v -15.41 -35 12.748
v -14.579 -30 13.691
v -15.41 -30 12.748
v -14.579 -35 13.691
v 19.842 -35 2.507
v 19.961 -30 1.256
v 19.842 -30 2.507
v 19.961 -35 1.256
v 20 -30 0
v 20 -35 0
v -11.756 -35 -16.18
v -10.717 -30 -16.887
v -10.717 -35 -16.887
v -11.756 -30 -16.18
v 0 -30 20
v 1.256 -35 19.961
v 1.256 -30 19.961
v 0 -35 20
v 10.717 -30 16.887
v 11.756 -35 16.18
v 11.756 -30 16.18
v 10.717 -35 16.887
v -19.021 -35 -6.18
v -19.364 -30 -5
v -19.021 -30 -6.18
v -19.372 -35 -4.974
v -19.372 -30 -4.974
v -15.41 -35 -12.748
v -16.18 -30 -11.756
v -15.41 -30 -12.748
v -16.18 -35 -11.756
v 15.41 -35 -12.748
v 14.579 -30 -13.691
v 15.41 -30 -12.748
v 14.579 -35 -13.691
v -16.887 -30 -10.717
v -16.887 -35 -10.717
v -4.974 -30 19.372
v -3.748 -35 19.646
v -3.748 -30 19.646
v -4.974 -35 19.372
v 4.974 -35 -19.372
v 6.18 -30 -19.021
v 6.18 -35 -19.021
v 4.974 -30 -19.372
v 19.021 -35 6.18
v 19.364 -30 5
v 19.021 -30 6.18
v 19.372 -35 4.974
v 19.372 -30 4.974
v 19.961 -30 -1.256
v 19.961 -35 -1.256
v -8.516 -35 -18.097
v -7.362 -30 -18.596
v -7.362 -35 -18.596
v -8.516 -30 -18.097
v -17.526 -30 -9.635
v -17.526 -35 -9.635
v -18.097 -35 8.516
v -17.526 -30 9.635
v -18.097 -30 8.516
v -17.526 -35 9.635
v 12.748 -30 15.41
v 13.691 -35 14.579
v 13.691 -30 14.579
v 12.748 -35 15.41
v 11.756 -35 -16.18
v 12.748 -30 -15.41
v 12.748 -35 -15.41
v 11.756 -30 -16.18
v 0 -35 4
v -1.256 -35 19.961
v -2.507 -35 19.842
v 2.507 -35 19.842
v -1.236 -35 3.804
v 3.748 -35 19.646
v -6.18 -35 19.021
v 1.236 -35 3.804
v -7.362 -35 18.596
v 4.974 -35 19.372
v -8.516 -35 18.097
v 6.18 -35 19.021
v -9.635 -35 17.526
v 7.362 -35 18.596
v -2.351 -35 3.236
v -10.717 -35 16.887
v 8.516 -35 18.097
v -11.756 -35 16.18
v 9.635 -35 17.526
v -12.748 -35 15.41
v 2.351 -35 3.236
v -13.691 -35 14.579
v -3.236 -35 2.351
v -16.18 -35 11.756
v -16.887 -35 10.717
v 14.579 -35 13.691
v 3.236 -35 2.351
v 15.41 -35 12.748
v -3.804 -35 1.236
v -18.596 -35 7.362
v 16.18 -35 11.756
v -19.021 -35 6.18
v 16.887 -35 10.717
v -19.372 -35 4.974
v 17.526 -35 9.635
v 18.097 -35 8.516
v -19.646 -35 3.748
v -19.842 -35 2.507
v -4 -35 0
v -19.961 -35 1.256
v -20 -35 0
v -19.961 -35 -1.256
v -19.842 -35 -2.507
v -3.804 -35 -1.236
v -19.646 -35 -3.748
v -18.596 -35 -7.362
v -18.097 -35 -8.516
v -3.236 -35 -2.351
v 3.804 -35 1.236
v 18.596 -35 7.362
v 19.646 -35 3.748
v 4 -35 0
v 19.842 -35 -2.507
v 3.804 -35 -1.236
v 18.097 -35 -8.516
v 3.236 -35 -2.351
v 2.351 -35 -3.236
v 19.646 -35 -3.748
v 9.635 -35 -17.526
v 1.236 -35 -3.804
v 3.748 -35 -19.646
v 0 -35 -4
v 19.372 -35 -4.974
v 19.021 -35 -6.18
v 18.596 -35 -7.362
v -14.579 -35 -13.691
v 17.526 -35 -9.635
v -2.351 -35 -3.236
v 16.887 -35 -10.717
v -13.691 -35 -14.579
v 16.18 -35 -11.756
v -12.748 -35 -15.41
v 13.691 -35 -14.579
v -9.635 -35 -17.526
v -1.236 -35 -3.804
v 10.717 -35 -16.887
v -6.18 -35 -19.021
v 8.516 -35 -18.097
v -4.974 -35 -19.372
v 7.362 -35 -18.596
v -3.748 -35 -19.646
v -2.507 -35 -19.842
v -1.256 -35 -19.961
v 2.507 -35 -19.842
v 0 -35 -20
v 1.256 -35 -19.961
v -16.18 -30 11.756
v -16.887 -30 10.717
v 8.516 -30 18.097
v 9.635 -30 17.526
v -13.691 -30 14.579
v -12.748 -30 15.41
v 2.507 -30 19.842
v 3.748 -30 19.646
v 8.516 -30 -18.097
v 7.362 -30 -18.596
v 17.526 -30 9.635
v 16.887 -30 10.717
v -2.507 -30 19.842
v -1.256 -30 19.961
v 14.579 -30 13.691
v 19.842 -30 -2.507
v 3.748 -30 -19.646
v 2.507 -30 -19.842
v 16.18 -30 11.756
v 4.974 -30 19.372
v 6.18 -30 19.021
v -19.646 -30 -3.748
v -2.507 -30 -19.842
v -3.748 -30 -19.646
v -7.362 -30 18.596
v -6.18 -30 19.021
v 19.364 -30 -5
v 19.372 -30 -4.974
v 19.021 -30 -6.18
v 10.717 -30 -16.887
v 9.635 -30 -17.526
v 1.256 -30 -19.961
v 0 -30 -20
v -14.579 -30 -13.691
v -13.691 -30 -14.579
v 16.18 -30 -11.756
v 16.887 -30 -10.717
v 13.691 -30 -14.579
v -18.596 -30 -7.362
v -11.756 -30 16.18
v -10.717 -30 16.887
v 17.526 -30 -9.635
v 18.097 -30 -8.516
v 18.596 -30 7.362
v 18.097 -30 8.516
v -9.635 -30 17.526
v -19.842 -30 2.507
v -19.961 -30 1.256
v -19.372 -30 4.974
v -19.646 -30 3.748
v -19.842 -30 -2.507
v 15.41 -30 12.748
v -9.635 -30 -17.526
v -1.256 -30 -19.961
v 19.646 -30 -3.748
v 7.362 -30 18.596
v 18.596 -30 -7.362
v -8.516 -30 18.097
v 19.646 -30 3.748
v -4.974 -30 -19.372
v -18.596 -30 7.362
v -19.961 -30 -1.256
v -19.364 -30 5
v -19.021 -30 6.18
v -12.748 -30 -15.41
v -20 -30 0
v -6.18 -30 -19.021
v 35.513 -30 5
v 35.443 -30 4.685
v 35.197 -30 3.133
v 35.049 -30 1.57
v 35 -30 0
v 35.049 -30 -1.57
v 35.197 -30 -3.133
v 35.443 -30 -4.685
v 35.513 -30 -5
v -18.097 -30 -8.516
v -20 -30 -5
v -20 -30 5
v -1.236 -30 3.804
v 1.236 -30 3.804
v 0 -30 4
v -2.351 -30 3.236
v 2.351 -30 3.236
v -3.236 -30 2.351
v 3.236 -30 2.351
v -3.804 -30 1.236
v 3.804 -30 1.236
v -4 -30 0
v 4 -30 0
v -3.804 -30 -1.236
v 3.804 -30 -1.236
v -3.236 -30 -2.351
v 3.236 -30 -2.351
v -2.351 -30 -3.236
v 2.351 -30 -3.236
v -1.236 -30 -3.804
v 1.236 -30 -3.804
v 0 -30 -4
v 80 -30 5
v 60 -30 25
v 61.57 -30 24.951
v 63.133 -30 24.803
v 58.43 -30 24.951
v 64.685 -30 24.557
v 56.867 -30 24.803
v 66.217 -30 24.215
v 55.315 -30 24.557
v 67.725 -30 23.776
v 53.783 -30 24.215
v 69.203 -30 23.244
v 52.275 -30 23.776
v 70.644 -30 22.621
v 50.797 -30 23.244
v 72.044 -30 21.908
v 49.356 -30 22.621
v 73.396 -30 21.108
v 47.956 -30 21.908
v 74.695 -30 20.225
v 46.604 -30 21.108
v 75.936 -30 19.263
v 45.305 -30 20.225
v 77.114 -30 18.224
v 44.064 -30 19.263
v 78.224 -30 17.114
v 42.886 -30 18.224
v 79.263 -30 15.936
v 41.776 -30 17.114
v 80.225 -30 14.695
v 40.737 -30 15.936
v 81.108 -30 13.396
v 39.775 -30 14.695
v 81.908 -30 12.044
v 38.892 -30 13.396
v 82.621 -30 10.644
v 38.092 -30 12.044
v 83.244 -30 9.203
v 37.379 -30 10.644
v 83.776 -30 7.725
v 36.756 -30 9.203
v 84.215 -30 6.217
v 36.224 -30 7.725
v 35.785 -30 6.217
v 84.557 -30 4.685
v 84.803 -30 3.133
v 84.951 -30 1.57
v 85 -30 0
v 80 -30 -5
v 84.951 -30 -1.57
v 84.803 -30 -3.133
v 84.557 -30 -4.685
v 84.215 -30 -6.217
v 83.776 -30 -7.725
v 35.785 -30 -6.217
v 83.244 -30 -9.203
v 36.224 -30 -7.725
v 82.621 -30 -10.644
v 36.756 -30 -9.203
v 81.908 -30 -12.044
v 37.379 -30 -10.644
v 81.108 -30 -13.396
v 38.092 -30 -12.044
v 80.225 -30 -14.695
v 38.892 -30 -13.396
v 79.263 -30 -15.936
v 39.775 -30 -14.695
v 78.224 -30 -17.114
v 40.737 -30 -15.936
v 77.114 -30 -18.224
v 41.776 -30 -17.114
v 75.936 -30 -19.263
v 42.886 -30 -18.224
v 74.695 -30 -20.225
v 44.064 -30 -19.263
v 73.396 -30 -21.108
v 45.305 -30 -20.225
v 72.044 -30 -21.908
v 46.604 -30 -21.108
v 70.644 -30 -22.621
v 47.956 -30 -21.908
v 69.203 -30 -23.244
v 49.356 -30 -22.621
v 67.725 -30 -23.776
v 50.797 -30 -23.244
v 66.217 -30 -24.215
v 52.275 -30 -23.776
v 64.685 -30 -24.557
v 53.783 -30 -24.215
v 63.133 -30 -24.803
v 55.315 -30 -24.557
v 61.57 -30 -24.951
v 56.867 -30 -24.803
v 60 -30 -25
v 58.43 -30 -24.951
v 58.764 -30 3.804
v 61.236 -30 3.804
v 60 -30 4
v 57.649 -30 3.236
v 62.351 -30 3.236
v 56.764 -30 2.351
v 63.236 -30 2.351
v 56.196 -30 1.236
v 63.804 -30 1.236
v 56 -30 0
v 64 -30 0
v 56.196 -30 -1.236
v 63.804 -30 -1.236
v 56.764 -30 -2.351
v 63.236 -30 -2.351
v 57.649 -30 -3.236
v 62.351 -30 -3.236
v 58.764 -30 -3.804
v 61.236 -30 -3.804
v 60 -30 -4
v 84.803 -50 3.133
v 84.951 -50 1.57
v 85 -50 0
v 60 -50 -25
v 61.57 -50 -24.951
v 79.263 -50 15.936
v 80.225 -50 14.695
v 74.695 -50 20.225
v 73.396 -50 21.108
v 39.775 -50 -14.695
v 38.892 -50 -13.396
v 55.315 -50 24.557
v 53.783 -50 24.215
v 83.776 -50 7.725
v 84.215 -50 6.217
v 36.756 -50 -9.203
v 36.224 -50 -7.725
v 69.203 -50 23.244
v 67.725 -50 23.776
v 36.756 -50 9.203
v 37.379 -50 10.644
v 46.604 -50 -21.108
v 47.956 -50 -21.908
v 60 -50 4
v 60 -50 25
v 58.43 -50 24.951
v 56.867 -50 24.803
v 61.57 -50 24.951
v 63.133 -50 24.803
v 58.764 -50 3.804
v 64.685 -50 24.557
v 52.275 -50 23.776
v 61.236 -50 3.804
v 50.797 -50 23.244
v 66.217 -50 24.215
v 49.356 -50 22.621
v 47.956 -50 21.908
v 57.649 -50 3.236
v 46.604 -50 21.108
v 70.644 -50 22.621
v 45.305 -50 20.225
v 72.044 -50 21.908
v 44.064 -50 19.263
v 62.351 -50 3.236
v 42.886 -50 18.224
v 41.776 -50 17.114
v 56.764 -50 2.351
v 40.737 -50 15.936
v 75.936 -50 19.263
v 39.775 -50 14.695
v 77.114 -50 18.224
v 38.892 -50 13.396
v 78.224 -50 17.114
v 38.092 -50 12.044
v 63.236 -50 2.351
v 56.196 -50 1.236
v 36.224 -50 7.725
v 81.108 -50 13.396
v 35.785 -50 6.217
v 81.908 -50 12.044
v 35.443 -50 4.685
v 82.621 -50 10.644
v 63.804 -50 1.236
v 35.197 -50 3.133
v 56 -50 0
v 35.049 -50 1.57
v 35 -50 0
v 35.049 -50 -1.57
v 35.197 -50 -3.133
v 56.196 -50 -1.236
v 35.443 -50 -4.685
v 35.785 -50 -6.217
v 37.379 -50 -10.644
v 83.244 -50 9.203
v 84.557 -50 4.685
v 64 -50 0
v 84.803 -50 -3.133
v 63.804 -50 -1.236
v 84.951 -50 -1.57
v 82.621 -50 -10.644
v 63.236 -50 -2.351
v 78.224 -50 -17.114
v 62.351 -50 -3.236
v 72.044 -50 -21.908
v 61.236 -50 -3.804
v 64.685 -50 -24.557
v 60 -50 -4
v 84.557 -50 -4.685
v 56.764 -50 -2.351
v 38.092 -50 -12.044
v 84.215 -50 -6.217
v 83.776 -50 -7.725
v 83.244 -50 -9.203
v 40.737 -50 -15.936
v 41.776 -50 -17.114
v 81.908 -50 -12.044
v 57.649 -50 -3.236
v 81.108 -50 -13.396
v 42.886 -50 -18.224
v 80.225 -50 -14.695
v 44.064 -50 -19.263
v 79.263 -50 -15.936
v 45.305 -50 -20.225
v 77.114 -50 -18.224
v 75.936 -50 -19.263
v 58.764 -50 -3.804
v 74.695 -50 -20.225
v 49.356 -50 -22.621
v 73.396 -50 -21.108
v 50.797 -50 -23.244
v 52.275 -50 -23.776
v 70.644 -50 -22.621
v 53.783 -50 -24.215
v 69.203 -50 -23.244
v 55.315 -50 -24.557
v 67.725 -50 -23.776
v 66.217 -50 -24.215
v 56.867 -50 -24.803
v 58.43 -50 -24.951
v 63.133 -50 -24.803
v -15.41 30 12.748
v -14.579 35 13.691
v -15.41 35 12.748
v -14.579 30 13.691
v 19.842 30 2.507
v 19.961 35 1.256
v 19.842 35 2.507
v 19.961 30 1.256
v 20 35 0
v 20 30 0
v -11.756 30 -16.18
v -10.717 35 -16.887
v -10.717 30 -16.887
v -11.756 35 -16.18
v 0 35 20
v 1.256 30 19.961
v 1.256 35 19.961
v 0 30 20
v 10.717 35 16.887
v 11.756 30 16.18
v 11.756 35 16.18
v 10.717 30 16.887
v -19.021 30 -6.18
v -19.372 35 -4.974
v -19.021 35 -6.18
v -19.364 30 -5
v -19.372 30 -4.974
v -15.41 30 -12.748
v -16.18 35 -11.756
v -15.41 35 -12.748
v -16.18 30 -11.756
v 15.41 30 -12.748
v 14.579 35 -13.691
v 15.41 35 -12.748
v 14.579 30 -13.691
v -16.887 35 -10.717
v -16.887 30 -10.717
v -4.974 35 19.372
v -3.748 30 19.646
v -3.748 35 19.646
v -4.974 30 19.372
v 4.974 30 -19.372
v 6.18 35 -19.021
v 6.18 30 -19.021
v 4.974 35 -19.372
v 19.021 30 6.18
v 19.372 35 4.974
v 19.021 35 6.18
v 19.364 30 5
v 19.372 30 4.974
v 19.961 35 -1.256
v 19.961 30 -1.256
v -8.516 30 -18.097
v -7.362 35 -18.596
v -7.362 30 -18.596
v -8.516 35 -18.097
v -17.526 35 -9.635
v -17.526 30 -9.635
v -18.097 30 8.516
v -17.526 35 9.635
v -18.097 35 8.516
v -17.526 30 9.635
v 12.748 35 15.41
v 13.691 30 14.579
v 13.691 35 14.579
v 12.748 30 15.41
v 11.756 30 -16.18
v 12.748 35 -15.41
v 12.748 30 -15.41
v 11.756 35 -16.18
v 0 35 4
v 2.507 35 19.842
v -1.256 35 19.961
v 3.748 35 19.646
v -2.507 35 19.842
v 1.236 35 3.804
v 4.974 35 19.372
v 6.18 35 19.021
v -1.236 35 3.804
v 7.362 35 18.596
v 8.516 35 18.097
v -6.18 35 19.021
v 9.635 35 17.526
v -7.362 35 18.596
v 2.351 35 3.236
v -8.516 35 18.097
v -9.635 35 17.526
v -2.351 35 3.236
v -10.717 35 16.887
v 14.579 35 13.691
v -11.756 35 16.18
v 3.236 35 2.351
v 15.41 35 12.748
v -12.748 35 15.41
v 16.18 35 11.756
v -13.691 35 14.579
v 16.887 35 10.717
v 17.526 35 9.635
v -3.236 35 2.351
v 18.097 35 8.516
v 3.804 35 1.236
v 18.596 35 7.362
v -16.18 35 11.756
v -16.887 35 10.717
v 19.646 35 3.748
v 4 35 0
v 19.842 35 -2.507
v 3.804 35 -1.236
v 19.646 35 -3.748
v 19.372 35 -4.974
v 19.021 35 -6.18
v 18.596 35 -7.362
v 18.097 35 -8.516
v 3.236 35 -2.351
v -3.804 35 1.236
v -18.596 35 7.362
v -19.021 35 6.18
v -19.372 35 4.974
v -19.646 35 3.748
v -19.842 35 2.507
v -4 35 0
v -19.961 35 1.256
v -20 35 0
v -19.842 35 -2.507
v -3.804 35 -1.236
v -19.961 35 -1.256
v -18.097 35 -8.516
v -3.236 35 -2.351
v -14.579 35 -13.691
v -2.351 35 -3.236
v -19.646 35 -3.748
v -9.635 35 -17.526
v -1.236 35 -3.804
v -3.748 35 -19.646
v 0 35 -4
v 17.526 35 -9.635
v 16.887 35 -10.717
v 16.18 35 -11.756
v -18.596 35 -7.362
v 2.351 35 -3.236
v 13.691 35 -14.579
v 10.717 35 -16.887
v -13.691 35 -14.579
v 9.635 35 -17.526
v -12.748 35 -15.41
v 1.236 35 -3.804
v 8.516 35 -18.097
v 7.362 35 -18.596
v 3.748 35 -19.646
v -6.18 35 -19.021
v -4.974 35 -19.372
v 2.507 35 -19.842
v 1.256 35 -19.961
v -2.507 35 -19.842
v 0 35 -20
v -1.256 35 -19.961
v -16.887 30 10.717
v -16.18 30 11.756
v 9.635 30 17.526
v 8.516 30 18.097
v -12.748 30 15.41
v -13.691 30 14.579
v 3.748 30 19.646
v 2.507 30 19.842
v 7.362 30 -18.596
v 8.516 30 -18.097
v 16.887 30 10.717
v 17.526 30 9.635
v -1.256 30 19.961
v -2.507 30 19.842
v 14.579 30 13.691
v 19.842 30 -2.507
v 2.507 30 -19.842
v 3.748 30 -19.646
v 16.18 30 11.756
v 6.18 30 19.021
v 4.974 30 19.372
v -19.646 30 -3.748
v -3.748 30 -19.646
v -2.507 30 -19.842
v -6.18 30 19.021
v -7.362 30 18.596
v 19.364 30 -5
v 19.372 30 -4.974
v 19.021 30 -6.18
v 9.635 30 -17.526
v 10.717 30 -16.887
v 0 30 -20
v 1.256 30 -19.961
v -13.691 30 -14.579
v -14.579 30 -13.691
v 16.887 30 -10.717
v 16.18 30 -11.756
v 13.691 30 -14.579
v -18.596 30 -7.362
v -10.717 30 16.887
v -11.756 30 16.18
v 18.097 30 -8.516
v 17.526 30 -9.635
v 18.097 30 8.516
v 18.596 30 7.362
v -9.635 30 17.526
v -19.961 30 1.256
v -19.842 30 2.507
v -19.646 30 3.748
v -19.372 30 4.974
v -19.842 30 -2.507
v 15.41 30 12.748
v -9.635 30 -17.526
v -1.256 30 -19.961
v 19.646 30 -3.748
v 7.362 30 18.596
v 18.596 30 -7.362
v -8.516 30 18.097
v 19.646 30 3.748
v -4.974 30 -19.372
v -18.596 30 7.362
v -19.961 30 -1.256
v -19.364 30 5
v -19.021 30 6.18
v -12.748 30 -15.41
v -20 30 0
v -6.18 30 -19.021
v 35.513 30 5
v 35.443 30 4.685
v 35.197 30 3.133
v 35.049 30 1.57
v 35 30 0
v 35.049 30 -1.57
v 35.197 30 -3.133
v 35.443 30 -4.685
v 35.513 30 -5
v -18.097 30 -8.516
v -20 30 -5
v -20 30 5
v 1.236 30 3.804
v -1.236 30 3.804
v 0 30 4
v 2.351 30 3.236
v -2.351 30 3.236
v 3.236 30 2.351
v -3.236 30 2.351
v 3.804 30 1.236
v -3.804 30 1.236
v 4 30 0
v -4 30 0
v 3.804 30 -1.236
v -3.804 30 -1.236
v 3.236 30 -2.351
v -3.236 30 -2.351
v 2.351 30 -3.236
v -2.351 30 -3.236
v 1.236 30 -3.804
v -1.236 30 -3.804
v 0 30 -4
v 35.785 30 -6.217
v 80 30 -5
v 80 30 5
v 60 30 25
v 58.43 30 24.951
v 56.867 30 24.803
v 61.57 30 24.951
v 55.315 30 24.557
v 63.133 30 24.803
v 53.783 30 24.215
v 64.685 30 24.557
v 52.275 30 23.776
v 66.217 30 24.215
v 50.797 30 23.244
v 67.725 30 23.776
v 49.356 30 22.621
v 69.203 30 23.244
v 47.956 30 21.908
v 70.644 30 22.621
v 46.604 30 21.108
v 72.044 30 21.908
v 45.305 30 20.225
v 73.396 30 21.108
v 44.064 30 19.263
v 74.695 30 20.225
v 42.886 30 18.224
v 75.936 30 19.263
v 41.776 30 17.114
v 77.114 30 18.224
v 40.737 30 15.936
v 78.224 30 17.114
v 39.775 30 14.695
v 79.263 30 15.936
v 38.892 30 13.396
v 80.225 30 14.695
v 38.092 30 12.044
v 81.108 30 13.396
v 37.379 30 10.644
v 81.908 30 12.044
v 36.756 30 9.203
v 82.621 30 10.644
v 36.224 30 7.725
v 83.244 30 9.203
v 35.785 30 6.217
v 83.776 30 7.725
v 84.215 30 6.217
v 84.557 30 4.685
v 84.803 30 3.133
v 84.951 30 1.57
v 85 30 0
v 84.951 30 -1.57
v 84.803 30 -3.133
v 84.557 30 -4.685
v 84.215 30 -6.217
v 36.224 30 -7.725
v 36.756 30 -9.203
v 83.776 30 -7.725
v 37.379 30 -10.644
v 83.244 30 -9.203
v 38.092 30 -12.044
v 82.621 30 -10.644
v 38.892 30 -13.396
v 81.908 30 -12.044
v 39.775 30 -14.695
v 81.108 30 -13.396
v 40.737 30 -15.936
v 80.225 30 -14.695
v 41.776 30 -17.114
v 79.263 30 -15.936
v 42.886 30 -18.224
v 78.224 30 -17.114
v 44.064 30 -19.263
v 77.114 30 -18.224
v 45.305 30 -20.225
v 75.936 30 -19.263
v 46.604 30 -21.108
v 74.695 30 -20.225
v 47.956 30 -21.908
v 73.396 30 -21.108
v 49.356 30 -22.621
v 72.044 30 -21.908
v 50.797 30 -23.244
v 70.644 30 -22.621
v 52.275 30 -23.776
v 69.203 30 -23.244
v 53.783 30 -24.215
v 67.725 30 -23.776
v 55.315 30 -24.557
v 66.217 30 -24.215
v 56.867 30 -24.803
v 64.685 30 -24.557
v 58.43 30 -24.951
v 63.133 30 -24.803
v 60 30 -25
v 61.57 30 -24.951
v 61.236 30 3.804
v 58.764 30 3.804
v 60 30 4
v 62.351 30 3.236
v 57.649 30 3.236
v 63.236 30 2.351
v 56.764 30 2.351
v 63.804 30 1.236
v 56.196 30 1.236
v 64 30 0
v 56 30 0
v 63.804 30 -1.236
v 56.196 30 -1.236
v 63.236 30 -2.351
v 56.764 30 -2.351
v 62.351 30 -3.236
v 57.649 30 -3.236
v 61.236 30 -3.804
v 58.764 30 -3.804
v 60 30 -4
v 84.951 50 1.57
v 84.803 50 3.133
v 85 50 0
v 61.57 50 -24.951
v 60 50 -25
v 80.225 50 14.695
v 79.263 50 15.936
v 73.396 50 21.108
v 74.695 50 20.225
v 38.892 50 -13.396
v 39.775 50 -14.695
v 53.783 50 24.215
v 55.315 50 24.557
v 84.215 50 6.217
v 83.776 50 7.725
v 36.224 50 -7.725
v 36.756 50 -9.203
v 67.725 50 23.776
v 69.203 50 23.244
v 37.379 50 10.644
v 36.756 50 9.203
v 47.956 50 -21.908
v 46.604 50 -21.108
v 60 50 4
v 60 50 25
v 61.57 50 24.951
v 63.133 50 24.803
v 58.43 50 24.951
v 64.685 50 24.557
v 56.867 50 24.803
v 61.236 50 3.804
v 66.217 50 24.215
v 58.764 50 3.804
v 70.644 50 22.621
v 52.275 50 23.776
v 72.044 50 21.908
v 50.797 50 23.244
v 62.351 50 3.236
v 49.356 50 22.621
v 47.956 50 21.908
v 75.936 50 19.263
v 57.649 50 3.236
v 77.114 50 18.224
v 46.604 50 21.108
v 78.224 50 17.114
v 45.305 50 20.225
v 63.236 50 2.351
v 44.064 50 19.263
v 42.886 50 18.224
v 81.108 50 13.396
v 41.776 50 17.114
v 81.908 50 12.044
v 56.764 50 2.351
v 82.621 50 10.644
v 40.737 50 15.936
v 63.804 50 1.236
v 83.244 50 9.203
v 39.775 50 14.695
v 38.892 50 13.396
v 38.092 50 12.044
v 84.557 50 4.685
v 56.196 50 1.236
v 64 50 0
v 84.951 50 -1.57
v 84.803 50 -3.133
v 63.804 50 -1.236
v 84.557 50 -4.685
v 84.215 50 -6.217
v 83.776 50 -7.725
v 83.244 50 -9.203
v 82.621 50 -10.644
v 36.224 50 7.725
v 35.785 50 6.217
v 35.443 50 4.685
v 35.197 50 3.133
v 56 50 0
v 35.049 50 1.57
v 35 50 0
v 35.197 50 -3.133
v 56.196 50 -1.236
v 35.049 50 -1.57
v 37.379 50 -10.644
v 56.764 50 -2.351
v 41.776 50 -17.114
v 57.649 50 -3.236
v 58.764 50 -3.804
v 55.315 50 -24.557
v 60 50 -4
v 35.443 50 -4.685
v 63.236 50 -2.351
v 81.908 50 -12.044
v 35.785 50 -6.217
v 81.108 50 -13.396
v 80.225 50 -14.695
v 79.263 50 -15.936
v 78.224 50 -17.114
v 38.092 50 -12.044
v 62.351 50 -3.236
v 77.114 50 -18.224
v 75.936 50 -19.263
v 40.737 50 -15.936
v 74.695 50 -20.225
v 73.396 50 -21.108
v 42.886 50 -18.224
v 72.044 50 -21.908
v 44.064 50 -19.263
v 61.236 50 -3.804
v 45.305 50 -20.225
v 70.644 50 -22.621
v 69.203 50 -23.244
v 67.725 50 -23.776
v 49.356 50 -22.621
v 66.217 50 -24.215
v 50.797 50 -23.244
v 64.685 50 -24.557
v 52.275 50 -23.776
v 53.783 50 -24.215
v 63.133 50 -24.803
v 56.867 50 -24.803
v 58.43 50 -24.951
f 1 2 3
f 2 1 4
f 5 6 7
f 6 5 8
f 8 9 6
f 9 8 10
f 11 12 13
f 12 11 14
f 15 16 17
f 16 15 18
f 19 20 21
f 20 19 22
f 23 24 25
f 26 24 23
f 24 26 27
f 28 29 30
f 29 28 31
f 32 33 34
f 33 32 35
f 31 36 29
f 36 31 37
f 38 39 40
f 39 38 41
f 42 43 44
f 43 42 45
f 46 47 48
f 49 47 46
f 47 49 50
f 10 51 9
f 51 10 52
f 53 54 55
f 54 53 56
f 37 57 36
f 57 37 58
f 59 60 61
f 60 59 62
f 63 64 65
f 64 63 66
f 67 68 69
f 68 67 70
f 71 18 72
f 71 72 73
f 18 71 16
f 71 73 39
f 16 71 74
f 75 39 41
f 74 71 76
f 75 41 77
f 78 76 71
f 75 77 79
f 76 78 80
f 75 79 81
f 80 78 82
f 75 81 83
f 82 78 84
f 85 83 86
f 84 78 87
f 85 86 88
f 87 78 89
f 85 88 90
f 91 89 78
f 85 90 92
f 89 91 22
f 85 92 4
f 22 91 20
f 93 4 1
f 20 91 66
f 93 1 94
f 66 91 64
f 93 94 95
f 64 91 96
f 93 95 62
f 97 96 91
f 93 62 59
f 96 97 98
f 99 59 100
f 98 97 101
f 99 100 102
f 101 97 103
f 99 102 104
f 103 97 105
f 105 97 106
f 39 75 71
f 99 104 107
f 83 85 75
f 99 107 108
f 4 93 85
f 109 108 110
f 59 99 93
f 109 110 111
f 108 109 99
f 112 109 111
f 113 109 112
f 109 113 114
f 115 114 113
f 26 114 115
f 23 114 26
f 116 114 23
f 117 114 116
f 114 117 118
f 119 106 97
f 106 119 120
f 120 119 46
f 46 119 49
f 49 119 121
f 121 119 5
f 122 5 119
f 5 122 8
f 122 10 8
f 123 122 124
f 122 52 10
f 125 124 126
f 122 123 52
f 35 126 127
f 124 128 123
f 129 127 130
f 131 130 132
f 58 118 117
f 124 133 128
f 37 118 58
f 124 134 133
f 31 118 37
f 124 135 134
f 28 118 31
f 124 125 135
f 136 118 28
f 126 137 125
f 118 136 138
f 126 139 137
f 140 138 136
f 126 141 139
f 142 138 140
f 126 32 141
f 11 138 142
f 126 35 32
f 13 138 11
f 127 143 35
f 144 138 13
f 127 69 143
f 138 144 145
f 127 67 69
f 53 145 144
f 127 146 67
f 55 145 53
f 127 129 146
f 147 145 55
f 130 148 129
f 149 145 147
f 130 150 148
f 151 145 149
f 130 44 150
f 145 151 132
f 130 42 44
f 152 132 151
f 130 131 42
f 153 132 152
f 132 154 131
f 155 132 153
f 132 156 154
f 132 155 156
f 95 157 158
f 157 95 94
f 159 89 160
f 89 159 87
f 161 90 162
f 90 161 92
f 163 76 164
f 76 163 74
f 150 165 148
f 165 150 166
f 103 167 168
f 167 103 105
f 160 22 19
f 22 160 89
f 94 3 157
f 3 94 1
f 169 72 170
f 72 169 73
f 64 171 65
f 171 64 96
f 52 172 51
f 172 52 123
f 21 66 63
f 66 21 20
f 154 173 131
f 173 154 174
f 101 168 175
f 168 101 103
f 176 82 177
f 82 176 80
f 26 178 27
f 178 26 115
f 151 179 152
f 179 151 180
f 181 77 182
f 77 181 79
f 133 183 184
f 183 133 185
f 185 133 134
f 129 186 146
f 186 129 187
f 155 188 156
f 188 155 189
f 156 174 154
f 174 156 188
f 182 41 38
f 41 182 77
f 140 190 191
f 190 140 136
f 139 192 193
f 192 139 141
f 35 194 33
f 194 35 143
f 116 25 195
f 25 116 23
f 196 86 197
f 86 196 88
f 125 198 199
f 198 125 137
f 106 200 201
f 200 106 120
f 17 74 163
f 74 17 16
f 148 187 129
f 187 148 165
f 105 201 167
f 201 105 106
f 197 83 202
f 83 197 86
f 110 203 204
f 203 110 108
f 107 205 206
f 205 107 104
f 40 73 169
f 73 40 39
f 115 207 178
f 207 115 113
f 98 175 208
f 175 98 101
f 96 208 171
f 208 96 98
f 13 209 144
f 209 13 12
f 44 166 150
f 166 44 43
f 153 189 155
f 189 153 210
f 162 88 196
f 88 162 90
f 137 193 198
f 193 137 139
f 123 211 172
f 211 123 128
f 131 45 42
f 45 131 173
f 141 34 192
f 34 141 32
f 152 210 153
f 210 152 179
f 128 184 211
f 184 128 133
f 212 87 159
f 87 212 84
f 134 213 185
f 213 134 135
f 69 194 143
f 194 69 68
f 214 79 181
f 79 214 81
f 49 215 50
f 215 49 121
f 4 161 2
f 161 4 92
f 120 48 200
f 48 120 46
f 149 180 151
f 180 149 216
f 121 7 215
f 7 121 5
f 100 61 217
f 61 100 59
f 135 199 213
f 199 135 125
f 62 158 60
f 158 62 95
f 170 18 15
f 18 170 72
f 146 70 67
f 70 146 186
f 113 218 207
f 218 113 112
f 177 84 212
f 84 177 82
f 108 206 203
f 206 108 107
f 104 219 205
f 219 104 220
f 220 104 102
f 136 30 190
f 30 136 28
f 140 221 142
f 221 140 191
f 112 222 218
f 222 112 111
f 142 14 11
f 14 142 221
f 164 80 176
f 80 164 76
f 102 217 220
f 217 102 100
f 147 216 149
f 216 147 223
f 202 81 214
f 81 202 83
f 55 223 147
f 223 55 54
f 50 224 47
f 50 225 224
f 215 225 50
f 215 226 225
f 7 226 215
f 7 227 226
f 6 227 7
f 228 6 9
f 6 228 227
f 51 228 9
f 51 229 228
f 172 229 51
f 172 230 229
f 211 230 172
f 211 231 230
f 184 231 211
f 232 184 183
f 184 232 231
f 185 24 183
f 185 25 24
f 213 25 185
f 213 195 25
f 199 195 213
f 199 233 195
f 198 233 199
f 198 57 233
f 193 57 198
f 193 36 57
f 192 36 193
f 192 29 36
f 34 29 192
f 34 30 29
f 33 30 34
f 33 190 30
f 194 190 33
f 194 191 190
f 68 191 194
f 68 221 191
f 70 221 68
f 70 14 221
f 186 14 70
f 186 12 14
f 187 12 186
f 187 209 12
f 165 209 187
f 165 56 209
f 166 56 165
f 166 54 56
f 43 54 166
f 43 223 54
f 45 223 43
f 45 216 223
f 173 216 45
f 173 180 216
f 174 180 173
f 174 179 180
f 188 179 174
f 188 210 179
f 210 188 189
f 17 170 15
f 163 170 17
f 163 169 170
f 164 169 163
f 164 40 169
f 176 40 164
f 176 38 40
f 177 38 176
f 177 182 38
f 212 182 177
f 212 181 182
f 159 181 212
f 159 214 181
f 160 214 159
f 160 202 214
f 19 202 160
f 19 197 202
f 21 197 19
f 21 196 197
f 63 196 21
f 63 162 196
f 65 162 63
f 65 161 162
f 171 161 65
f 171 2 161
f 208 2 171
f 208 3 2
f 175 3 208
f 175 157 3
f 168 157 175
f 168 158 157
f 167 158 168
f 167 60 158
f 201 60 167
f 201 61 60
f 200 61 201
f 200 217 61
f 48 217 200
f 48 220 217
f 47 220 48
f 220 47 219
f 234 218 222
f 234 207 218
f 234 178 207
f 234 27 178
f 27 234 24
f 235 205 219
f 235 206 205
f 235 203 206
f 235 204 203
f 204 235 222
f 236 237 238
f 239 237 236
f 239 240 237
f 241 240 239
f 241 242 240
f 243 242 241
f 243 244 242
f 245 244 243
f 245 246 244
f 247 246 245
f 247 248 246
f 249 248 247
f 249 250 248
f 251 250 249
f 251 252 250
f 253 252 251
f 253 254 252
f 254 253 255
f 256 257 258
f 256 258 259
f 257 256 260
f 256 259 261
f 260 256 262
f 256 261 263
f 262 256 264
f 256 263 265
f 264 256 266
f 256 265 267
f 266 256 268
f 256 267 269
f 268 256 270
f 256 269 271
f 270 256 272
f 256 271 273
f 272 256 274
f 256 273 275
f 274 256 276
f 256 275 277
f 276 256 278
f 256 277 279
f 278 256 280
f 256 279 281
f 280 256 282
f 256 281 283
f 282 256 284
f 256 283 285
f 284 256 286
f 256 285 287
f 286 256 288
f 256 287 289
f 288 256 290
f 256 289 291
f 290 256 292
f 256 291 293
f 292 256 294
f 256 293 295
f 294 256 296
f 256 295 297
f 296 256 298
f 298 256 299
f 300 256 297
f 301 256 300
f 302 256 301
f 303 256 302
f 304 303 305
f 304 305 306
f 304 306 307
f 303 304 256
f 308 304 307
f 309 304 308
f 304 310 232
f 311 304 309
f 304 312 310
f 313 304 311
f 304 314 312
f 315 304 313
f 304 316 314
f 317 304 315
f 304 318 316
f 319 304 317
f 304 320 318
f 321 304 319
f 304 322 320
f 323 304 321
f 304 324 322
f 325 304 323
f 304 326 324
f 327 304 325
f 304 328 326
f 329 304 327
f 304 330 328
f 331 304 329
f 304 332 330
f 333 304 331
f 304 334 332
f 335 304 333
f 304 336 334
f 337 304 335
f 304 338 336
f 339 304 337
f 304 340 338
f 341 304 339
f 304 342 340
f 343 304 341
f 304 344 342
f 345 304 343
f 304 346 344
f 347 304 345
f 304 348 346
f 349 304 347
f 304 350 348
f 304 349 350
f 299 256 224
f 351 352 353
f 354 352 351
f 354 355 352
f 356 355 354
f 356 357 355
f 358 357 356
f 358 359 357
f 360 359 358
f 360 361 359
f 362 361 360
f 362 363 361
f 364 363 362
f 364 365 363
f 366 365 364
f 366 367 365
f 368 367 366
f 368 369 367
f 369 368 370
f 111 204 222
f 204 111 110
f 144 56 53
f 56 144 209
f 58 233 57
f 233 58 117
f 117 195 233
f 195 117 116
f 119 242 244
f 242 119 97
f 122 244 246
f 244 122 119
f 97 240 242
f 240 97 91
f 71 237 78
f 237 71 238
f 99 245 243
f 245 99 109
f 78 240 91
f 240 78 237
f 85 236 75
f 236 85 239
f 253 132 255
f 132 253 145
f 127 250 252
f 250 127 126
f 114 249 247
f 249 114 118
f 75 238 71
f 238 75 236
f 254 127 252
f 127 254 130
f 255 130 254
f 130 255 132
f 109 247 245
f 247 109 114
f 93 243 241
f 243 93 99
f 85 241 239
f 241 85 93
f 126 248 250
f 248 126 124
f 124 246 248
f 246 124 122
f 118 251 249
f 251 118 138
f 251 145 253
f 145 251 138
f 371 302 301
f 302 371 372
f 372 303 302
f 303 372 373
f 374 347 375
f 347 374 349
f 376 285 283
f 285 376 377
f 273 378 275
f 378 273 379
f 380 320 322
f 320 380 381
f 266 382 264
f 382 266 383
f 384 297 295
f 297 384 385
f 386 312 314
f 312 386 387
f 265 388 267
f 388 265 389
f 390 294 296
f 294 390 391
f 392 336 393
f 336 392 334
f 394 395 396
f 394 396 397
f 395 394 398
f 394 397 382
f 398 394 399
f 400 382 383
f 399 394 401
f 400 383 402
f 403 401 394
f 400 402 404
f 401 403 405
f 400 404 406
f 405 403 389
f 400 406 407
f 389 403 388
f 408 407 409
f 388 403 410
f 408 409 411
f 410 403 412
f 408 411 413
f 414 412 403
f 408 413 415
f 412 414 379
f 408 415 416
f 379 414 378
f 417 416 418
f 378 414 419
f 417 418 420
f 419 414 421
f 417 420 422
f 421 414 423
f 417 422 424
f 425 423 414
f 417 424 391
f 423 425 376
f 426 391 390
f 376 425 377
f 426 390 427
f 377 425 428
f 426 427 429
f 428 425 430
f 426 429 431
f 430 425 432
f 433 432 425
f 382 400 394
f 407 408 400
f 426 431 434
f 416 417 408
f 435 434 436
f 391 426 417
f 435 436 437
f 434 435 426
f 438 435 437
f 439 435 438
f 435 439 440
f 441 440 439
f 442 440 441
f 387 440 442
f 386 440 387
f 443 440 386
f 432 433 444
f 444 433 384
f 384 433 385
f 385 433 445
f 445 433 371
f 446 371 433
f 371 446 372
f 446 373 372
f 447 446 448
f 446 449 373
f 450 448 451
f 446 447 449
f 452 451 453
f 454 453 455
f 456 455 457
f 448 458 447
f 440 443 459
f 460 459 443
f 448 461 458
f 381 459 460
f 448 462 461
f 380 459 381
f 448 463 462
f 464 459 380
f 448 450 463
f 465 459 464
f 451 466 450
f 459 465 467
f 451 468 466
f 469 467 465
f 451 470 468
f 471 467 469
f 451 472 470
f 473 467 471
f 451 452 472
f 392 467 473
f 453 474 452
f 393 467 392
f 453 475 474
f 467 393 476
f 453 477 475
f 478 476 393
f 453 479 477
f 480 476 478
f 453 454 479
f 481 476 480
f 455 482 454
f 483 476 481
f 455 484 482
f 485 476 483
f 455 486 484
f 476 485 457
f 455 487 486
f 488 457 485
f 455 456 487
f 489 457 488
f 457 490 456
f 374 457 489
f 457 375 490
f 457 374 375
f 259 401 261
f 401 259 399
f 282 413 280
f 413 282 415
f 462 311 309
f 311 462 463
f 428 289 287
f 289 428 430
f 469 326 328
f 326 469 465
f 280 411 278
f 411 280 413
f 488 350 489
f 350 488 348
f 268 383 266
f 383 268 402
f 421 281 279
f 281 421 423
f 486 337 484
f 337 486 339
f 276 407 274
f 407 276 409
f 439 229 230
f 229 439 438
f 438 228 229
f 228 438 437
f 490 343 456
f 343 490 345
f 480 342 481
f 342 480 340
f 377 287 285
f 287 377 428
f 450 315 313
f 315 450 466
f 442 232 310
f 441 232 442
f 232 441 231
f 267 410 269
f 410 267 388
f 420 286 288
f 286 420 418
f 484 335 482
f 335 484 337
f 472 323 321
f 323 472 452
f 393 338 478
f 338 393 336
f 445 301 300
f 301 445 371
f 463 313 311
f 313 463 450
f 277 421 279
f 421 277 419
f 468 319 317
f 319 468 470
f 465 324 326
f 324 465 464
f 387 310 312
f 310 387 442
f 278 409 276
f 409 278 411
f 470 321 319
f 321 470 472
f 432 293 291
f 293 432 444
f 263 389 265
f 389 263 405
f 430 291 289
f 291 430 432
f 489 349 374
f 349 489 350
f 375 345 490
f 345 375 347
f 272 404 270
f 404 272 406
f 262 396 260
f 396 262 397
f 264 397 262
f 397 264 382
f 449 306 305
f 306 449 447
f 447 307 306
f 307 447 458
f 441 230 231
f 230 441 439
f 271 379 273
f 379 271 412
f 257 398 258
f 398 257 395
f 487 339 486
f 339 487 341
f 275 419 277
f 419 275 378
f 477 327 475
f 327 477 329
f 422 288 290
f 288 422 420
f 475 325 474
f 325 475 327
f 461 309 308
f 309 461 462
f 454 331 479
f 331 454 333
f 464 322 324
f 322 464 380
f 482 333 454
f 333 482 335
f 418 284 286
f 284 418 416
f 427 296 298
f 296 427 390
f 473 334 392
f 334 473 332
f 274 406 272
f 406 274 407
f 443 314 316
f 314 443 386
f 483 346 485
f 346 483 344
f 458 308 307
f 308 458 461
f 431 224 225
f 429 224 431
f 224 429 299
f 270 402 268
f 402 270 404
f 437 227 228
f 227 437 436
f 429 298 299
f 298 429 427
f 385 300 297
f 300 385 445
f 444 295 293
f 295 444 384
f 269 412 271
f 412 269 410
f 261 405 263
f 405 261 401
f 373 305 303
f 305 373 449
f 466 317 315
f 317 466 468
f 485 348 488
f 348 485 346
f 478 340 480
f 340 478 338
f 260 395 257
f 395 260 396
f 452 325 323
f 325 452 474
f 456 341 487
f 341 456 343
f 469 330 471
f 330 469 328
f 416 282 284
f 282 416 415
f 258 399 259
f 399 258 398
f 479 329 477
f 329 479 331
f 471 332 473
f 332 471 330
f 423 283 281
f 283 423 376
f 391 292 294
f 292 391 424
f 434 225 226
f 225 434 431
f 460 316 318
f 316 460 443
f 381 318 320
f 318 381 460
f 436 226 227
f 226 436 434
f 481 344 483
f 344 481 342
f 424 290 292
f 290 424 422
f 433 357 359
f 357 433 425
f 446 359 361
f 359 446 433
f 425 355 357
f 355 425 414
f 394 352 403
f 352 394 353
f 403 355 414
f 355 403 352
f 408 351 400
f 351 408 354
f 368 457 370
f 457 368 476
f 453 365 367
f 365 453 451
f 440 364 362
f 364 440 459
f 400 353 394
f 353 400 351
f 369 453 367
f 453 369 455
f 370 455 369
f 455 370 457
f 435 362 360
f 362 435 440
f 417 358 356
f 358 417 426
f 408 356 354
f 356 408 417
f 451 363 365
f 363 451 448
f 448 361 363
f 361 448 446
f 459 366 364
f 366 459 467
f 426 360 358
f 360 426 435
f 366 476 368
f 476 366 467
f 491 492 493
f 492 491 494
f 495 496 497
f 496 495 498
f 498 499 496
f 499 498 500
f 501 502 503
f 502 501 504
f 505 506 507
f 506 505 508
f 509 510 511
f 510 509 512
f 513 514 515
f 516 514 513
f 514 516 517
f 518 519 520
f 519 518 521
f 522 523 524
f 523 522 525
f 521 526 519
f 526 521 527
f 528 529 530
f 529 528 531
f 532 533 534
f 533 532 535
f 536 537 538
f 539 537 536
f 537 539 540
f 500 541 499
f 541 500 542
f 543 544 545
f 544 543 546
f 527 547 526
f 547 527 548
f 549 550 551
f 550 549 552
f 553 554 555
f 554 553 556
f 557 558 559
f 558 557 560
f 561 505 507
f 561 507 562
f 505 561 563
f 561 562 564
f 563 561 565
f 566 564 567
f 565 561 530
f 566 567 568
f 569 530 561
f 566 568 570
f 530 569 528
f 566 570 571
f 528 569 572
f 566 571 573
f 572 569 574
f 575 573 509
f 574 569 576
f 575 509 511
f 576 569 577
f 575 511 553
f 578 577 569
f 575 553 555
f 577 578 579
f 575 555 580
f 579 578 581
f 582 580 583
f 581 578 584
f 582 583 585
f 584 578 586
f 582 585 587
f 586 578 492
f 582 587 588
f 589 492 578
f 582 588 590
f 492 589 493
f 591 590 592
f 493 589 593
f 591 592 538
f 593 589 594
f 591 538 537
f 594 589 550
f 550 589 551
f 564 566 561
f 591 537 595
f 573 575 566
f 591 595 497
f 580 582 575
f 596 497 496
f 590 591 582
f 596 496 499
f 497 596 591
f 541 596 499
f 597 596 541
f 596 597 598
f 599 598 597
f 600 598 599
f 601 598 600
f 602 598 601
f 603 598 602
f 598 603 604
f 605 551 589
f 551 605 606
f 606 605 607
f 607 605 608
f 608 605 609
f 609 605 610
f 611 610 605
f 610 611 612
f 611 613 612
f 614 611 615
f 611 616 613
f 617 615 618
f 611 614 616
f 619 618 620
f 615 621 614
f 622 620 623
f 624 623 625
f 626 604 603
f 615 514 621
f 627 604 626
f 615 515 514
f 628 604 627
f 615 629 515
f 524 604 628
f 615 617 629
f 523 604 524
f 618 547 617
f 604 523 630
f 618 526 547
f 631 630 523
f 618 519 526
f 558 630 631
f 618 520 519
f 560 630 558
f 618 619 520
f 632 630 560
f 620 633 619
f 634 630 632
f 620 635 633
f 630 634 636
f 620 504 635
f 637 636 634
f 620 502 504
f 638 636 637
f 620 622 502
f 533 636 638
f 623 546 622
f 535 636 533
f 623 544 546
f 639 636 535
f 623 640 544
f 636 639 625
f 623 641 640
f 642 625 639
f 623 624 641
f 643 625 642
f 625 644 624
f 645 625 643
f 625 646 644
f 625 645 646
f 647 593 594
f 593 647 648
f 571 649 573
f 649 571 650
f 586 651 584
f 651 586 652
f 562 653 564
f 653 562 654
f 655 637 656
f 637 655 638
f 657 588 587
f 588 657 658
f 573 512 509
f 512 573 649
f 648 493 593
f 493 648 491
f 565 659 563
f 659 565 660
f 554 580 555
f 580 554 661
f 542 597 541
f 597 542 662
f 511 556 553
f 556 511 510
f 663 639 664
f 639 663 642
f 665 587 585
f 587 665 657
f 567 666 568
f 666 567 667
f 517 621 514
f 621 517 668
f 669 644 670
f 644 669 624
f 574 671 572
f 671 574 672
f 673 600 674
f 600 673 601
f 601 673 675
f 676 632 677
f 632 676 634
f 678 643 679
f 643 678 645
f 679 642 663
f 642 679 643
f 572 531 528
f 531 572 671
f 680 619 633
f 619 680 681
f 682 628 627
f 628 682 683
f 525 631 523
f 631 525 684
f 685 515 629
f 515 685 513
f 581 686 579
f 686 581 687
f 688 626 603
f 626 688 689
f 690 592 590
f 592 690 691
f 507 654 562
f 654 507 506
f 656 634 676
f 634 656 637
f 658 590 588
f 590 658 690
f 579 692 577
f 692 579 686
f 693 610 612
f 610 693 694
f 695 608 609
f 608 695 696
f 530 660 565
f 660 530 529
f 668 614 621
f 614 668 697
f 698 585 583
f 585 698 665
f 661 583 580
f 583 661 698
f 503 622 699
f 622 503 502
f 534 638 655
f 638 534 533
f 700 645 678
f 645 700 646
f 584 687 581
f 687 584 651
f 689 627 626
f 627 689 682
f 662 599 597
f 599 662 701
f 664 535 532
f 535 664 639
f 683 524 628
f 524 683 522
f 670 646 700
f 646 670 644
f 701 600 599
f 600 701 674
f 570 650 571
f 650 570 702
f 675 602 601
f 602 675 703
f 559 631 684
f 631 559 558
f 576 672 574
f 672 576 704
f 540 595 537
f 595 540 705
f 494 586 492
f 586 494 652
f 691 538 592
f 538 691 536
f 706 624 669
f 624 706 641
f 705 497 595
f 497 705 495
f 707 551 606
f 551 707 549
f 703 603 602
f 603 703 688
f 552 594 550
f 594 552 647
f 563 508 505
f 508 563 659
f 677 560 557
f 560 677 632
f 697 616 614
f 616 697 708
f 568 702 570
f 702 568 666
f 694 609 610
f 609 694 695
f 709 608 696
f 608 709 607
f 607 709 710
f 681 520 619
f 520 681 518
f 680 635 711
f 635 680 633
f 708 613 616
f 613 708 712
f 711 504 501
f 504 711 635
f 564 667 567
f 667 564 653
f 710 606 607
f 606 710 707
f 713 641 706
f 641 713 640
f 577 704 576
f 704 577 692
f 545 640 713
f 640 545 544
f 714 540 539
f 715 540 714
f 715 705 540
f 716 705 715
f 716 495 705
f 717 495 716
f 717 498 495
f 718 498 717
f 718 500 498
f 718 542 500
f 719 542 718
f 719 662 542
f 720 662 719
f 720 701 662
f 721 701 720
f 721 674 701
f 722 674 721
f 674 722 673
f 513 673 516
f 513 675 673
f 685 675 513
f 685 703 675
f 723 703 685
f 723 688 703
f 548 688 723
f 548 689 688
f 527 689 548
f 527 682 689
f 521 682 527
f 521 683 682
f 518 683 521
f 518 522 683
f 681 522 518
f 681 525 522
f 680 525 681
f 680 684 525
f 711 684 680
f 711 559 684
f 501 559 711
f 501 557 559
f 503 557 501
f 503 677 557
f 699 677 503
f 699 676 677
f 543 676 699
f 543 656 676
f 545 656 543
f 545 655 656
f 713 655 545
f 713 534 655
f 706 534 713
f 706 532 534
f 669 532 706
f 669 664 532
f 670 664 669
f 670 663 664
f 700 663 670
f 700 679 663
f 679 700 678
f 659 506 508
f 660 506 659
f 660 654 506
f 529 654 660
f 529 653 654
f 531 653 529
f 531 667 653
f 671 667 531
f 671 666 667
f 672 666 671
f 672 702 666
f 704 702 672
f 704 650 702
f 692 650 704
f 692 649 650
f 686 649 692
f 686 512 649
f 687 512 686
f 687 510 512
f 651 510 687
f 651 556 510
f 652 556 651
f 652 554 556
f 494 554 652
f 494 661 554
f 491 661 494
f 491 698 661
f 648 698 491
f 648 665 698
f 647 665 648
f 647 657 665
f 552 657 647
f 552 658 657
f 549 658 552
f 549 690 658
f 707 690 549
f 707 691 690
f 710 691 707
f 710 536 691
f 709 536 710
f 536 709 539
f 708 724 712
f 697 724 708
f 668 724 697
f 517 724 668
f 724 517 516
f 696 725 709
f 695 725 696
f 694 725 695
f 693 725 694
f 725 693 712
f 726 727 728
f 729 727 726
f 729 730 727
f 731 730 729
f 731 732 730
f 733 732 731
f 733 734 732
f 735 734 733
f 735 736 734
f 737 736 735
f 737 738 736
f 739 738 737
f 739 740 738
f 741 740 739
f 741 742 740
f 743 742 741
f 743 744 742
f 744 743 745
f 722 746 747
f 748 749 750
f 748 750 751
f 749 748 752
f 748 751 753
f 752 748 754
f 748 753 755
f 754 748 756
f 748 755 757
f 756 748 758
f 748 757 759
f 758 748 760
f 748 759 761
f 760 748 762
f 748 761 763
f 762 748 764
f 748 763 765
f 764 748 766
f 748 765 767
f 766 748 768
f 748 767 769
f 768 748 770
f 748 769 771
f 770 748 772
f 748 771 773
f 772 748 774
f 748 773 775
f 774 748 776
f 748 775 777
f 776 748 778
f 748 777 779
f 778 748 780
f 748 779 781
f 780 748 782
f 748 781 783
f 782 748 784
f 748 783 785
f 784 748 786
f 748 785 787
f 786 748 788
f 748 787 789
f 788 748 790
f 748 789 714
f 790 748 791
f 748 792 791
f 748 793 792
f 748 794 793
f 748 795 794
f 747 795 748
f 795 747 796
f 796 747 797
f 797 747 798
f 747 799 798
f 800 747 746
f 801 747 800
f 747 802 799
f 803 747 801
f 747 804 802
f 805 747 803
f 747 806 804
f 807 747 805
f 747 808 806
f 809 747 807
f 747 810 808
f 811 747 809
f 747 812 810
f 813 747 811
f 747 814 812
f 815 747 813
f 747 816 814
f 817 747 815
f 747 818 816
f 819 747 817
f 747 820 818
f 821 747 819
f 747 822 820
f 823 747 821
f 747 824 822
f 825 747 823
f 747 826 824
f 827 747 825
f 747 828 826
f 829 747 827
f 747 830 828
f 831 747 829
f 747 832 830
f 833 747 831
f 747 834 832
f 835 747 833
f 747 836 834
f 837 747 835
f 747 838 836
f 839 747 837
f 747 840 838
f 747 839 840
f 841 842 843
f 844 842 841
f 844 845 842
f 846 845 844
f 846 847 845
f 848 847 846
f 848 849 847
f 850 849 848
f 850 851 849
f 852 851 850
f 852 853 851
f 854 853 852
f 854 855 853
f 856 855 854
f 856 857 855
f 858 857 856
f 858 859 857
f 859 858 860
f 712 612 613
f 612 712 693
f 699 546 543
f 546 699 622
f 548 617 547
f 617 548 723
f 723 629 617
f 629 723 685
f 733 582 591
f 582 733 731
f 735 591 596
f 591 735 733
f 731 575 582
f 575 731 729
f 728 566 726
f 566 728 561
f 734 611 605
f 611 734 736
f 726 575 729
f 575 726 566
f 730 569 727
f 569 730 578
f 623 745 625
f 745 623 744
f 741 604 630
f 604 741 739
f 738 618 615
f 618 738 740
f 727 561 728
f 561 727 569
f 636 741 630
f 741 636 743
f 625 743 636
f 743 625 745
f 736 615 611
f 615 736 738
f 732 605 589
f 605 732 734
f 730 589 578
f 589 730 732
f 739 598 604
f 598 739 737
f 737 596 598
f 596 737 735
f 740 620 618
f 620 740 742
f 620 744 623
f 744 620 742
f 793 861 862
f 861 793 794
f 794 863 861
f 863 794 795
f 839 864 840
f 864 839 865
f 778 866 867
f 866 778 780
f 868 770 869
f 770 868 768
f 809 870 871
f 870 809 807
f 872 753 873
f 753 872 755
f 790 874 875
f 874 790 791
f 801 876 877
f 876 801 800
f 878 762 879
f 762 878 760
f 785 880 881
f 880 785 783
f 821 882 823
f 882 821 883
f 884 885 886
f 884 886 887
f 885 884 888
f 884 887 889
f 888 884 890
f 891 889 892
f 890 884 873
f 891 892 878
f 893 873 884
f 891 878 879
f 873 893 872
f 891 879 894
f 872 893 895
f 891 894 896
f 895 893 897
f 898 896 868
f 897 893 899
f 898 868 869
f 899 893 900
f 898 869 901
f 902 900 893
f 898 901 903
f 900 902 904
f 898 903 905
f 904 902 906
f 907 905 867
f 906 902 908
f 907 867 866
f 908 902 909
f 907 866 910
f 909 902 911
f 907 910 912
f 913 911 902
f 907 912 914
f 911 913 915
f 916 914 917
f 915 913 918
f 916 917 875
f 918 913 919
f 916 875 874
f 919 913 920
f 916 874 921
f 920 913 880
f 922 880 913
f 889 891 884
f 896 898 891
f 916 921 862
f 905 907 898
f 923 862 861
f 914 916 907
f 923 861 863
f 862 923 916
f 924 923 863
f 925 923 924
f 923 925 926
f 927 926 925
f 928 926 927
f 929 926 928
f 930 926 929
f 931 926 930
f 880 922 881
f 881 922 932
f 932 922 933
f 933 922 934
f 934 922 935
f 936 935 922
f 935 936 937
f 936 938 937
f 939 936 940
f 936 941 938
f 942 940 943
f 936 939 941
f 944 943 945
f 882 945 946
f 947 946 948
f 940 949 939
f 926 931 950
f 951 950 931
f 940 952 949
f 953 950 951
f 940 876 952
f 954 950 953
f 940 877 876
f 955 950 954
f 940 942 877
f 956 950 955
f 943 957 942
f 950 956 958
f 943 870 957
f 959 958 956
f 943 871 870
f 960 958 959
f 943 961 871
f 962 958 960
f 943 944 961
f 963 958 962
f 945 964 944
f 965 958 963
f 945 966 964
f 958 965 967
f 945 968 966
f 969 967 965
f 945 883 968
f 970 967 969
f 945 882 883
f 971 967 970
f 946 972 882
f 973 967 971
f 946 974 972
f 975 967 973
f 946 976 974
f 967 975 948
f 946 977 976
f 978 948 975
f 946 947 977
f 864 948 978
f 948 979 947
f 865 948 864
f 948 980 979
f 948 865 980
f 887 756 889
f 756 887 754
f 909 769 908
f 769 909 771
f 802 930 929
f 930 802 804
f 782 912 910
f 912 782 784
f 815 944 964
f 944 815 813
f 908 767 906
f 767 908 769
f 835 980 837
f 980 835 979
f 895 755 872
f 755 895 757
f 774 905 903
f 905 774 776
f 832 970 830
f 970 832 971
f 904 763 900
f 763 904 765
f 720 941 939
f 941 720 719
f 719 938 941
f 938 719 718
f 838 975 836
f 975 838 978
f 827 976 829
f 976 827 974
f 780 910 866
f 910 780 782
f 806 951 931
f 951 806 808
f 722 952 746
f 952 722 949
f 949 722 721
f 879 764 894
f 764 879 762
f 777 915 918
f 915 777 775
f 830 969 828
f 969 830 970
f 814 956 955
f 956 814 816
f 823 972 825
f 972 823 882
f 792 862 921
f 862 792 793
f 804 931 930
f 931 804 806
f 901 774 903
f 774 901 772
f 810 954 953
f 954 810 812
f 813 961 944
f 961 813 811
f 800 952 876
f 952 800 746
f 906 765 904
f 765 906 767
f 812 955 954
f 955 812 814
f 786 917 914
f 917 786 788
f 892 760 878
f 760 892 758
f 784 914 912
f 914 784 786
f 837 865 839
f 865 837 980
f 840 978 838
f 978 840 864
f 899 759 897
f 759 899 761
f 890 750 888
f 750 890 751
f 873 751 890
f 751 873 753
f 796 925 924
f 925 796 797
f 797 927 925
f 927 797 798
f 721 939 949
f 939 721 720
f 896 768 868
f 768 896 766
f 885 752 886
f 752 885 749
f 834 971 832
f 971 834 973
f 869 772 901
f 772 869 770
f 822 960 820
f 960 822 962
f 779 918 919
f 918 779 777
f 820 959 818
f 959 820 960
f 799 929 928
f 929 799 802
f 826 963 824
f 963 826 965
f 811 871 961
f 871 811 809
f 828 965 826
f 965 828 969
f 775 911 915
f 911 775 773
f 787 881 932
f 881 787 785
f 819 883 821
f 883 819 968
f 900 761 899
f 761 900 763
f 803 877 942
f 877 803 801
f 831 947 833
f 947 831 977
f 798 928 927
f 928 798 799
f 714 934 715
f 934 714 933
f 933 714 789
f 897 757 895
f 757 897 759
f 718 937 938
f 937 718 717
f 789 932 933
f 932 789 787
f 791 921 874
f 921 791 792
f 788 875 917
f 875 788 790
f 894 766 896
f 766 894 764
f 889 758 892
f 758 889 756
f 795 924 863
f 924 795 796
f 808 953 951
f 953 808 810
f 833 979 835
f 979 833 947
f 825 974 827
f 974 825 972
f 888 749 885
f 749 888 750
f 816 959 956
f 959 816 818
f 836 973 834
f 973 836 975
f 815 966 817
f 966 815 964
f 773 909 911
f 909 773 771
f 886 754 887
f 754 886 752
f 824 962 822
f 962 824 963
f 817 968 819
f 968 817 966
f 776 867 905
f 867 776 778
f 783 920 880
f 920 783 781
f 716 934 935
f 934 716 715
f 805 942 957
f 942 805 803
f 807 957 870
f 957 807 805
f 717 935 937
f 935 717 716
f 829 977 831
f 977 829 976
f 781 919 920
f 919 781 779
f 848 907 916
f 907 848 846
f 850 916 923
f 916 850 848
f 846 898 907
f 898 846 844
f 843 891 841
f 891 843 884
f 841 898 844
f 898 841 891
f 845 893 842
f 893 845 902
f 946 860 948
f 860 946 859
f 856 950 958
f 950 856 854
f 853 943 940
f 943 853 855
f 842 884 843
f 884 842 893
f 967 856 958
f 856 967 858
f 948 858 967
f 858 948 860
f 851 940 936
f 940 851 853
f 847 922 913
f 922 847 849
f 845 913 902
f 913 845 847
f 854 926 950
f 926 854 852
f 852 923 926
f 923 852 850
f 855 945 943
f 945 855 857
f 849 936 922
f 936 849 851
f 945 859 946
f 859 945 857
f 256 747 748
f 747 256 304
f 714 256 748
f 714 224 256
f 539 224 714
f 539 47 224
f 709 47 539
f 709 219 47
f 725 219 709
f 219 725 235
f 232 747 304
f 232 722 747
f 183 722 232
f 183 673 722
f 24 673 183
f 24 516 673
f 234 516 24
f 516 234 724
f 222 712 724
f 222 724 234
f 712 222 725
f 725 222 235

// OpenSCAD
// file: rueda_simple.scad
module rueda_simple(grosor=5, diametro=40, diam_eje=8){

    //-- Construcción rueda simple a partir de parametros
    difference(){
        //-- Base de la rueda
        cylinder(r=diametro/2, h=grosor, $fn=100);
    
        //--Taladro de 8mm
        cylinder(r=diam_eje/2, h=3*grosor, $fn=20, center=true);
    }
}

//-- Ejemplos de uso del modulo
//-- Rueda por defecto
rueda_simple();

translate([-50,0,0])
    rueda_simple(grosor=20);

translate([50,0,0])
    rueda_simple(grosor=20, diametro=20);
// main file
use <rueda_simple.scad>

translate([30,0,0])
cube([100,60,10], center=true);

translate([0,-30,0])
    rotate([90,0,0])
        rueda_simple();
        
translate([60,-30,0])
    rotate([90,0,0])
        rueda_simple(grosor=20, diametro=50);
  
mirror([0,1,0]){  
    translate([0,-30,0])
        rotate([90,0,0])
            rueda_simple();
        
    translate([60,-30,0])
        rotate([90,0,0])
        rueda_simple(       grosor=20, diametro=50);
}
